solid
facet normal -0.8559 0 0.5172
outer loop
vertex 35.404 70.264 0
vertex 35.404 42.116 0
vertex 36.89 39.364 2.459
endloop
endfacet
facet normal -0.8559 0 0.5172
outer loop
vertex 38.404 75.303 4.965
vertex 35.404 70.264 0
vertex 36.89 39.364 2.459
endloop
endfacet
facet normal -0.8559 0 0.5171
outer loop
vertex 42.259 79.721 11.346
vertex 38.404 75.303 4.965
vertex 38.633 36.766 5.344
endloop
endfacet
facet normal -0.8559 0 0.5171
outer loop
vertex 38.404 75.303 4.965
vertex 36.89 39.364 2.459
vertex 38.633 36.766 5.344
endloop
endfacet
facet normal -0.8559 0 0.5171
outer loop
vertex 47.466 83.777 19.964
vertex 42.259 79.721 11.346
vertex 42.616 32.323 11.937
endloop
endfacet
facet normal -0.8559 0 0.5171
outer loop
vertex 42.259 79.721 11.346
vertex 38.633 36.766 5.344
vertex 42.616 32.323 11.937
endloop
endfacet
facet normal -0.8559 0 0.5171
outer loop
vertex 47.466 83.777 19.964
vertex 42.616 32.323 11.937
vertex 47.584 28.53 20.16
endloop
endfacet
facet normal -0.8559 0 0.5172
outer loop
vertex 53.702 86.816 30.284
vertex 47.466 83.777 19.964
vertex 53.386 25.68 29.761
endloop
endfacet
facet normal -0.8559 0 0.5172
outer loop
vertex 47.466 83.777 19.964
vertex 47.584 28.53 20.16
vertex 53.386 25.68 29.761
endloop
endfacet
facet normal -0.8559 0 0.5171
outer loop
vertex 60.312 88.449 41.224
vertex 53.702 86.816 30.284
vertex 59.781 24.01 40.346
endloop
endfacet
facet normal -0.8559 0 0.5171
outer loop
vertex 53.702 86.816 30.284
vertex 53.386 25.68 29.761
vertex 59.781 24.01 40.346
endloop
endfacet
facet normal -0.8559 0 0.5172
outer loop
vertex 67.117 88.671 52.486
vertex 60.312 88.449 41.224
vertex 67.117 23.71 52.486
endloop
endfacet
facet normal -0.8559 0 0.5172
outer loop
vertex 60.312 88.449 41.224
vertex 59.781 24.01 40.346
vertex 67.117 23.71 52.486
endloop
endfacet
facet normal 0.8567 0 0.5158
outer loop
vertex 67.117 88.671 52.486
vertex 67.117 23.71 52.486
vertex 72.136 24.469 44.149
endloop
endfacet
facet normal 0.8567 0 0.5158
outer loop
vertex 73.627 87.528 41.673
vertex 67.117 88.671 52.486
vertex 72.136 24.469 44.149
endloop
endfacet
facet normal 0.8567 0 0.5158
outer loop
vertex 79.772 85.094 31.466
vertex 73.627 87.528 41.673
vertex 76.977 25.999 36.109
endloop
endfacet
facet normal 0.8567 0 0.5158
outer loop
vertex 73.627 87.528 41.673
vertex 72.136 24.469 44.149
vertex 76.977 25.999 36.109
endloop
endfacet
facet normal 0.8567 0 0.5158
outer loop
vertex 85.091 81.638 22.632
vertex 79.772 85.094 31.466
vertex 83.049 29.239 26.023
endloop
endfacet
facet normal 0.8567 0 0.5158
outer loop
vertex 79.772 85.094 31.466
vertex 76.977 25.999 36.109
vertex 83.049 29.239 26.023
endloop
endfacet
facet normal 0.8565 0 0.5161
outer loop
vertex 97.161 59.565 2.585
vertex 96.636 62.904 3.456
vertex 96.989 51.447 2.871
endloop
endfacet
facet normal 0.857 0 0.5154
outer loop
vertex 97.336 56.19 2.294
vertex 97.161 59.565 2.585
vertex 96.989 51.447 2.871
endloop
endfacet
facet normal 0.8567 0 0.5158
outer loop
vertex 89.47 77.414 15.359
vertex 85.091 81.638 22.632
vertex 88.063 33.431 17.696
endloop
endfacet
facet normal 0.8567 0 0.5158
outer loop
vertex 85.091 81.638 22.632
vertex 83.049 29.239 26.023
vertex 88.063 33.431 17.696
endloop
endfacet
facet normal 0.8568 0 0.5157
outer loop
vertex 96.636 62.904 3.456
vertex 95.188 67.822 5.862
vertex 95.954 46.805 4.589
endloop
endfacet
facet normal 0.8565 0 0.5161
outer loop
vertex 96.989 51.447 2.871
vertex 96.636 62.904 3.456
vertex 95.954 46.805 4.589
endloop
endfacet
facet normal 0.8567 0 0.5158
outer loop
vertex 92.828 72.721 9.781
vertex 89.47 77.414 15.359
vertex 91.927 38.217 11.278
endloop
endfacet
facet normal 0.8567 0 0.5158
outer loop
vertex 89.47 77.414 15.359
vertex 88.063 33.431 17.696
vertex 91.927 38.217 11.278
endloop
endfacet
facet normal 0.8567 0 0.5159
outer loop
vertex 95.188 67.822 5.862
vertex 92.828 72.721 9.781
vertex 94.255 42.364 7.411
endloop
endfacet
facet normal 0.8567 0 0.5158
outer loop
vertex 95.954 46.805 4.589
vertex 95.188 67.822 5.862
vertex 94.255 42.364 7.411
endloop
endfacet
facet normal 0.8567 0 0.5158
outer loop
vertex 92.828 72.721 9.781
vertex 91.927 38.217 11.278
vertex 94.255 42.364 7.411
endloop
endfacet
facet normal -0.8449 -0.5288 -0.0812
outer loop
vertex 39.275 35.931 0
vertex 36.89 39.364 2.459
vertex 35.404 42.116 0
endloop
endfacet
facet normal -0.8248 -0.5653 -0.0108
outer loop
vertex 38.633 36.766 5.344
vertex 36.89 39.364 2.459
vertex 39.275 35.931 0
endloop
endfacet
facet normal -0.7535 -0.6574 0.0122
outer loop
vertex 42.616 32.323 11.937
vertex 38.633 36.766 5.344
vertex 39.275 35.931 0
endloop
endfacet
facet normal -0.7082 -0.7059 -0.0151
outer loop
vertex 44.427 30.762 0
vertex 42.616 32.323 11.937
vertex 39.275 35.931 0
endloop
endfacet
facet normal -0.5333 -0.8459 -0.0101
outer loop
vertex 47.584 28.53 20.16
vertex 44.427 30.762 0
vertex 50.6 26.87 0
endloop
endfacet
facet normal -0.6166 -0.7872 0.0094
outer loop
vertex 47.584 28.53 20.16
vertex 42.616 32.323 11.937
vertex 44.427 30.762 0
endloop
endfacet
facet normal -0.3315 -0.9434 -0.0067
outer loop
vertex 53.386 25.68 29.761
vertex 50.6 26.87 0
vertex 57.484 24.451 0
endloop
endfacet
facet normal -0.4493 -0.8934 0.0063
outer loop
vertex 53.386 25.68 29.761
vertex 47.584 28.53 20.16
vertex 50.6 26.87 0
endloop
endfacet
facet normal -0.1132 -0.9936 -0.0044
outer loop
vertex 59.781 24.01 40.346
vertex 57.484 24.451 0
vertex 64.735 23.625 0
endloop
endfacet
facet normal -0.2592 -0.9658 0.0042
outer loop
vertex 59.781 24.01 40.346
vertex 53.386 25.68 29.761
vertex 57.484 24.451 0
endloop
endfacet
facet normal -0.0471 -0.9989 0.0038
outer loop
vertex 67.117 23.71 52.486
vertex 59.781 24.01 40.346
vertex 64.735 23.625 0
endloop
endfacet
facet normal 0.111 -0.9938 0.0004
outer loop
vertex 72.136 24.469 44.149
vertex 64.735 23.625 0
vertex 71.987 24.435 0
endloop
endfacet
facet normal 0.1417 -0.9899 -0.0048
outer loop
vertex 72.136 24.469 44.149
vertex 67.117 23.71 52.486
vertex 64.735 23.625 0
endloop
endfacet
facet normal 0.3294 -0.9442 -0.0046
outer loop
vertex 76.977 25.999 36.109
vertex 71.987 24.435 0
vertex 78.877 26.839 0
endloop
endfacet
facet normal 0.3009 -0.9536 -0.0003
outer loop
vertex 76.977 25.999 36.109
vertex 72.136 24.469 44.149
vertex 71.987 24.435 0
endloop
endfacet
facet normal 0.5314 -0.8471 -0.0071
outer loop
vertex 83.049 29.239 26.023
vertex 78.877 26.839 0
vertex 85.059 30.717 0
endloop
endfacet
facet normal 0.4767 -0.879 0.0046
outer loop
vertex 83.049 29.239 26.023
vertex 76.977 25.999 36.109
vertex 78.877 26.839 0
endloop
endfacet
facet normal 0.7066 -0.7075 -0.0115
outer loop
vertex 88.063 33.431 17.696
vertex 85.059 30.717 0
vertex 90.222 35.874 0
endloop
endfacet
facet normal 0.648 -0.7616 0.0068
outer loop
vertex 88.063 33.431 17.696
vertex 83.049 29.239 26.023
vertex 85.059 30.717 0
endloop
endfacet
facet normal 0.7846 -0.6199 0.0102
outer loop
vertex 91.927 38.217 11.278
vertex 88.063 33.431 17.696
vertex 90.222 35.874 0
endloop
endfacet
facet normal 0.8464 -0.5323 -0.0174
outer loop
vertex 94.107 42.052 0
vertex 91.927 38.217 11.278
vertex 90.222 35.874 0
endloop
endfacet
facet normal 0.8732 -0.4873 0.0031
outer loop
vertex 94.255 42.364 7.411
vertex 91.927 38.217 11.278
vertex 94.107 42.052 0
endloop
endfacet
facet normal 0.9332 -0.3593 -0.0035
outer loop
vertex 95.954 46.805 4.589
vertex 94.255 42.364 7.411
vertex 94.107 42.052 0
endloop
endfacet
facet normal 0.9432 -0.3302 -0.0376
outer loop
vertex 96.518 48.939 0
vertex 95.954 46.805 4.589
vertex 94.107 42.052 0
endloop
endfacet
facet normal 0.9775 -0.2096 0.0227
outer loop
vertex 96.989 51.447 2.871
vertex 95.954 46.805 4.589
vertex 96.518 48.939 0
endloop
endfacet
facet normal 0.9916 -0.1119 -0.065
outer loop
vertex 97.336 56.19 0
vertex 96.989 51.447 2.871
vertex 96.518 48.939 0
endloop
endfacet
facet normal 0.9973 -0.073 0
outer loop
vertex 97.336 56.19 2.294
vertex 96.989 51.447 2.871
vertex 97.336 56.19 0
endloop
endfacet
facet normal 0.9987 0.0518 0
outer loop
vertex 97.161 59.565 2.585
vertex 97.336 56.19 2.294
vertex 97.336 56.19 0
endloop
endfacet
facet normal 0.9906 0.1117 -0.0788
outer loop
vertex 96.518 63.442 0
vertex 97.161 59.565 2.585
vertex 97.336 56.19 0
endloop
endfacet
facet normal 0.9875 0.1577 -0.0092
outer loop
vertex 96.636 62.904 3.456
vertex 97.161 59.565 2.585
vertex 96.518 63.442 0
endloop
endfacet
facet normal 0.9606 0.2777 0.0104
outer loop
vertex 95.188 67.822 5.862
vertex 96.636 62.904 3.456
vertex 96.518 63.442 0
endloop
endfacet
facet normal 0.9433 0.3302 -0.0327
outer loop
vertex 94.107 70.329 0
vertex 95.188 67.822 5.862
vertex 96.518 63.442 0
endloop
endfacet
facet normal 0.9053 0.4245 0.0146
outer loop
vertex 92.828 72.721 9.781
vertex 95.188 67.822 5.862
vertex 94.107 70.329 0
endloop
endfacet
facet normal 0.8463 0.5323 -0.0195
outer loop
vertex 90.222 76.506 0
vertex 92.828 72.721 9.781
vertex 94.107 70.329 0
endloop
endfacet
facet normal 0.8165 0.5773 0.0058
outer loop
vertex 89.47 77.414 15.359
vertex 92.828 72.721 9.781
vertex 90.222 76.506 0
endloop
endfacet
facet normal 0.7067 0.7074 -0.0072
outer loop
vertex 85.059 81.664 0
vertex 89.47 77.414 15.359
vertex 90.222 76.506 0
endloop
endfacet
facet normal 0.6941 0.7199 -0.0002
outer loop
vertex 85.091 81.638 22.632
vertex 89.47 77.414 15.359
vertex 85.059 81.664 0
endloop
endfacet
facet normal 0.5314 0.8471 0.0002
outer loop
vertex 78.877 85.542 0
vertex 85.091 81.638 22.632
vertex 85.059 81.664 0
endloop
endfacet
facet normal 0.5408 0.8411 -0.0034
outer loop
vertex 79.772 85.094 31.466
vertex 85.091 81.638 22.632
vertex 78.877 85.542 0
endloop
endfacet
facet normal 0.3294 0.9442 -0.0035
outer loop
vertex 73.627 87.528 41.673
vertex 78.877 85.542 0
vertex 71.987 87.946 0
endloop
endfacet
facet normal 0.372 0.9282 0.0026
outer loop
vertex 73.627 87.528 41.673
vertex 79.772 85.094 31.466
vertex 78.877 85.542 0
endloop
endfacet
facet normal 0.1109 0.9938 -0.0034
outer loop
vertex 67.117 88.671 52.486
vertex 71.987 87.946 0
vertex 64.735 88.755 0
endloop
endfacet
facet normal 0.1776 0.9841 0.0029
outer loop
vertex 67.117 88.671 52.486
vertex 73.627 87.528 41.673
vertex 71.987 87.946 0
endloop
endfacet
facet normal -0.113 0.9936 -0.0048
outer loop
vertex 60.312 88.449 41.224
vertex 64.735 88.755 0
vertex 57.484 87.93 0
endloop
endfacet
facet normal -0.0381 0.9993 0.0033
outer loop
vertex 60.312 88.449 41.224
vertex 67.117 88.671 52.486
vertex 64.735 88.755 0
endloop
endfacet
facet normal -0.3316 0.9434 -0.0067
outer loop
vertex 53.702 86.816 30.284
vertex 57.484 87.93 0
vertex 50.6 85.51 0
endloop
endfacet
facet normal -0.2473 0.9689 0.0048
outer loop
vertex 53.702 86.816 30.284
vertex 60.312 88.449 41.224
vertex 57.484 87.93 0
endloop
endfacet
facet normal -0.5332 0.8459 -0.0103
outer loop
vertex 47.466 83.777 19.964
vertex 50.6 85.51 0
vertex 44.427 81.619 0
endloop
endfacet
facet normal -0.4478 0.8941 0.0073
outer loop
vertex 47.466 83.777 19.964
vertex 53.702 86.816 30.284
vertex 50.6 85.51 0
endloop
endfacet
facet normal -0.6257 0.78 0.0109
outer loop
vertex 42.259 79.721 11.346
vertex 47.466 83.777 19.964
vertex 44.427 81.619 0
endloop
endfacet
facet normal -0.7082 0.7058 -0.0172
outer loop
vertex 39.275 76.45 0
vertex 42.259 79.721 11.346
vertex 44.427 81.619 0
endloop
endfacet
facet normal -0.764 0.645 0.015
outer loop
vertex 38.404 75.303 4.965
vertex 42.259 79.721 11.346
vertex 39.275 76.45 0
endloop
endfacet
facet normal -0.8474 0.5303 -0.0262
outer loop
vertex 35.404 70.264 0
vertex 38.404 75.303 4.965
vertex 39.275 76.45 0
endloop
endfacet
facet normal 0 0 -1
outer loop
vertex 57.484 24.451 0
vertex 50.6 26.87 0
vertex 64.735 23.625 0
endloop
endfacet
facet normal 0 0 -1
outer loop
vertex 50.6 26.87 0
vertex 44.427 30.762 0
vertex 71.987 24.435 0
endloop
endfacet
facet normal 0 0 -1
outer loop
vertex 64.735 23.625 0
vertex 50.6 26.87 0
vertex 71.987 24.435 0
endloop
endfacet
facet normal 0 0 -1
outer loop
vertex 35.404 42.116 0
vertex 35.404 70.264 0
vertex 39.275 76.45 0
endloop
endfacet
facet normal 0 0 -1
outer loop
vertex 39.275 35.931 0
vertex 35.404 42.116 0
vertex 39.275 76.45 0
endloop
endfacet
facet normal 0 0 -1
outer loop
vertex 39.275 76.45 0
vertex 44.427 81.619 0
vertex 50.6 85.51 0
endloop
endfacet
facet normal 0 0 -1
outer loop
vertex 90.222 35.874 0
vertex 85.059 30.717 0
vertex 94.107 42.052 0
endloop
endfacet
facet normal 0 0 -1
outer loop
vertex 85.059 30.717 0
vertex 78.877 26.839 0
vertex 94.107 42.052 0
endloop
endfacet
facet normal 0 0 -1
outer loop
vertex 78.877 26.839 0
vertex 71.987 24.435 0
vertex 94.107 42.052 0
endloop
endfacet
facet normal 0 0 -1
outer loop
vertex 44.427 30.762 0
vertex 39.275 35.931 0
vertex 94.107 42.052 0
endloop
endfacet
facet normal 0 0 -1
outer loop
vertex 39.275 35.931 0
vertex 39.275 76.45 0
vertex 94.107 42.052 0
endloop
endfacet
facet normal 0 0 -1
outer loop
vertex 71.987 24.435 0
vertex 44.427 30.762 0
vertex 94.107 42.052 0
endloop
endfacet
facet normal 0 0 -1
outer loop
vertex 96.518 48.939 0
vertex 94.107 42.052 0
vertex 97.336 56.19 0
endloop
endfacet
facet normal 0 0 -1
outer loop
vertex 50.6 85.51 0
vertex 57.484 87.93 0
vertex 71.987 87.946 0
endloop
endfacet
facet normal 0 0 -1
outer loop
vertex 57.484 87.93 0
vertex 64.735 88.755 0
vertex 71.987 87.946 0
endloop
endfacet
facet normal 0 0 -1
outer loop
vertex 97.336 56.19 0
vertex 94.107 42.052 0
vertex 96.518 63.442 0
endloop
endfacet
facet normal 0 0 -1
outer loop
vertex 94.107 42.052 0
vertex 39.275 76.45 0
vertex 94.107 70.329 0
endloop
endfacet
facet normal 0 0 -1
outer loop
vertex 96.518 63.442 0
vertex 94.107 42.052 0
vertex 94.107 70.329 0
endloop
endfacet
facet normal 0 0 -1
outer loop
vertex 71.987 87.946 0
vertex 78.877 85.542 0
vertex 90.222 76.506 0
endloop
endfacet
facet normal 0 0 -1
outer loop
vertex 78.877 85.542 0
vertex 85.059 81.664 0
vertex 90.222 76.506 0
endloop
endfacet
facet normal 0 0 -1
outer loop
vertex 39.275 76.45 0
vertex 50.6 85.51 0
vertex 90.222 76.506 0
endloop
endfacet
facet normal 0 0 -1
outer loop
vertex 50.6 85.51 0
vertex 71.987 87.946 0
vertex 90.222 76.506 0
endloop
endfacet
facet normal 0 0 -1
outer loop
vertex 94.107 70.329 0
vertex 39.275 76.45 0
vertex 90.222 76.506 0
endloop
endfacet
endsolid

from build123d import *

# Parameters (mm, degrees)
F0_W     = 83.739126
F0_H     = 85.135351
F1_DEPTH = 76.2
F2_W     = 83.739126
F2_H     = 85.135351
F2_R     = 32.565114
F3_DEPTH = 76.2
F4_R     = 86.130148
F5_DEPTH = 152.4


with BuildPart() as f1:
    # F0 (on Top) → F1 (new body)
    with BuildSketch(Plane.XY):
        with Locations((65.940666, 56.417251)):
            Rectangle(F0_W, F0_H)
    extrude(amount=F1_DEPTH)

    # F2 (on face) → F3 (cut)
    with BuildSketch(Plane.XY.offset(76.2)):
        with Locations((65.940666, 56.417251)):
            Rectangle(F2_W, F2_H)
        with Locations((64.77081, 56.190282)):
            Circle(F2_R, mode=Mode.SUBTRACT)
    extrude(amount=-F3_DEPTH, mode=Mode.SUBTRACT)

    # F4 (on Front) → F5 (cut)
    with BuildSketch(Plane.XZ):
        with Locations((64.846843, 15.613325)):
            Circle(F4_R)
        Polygon((98.717026, 0), (35.403937, 0), (67.116521, 52.486237), align=None, mode=Mode.SUBTRACT)
    extrude(amount=-F5_DEPTH, mode=Mode.SUBTRACT)


solid = f1.part
